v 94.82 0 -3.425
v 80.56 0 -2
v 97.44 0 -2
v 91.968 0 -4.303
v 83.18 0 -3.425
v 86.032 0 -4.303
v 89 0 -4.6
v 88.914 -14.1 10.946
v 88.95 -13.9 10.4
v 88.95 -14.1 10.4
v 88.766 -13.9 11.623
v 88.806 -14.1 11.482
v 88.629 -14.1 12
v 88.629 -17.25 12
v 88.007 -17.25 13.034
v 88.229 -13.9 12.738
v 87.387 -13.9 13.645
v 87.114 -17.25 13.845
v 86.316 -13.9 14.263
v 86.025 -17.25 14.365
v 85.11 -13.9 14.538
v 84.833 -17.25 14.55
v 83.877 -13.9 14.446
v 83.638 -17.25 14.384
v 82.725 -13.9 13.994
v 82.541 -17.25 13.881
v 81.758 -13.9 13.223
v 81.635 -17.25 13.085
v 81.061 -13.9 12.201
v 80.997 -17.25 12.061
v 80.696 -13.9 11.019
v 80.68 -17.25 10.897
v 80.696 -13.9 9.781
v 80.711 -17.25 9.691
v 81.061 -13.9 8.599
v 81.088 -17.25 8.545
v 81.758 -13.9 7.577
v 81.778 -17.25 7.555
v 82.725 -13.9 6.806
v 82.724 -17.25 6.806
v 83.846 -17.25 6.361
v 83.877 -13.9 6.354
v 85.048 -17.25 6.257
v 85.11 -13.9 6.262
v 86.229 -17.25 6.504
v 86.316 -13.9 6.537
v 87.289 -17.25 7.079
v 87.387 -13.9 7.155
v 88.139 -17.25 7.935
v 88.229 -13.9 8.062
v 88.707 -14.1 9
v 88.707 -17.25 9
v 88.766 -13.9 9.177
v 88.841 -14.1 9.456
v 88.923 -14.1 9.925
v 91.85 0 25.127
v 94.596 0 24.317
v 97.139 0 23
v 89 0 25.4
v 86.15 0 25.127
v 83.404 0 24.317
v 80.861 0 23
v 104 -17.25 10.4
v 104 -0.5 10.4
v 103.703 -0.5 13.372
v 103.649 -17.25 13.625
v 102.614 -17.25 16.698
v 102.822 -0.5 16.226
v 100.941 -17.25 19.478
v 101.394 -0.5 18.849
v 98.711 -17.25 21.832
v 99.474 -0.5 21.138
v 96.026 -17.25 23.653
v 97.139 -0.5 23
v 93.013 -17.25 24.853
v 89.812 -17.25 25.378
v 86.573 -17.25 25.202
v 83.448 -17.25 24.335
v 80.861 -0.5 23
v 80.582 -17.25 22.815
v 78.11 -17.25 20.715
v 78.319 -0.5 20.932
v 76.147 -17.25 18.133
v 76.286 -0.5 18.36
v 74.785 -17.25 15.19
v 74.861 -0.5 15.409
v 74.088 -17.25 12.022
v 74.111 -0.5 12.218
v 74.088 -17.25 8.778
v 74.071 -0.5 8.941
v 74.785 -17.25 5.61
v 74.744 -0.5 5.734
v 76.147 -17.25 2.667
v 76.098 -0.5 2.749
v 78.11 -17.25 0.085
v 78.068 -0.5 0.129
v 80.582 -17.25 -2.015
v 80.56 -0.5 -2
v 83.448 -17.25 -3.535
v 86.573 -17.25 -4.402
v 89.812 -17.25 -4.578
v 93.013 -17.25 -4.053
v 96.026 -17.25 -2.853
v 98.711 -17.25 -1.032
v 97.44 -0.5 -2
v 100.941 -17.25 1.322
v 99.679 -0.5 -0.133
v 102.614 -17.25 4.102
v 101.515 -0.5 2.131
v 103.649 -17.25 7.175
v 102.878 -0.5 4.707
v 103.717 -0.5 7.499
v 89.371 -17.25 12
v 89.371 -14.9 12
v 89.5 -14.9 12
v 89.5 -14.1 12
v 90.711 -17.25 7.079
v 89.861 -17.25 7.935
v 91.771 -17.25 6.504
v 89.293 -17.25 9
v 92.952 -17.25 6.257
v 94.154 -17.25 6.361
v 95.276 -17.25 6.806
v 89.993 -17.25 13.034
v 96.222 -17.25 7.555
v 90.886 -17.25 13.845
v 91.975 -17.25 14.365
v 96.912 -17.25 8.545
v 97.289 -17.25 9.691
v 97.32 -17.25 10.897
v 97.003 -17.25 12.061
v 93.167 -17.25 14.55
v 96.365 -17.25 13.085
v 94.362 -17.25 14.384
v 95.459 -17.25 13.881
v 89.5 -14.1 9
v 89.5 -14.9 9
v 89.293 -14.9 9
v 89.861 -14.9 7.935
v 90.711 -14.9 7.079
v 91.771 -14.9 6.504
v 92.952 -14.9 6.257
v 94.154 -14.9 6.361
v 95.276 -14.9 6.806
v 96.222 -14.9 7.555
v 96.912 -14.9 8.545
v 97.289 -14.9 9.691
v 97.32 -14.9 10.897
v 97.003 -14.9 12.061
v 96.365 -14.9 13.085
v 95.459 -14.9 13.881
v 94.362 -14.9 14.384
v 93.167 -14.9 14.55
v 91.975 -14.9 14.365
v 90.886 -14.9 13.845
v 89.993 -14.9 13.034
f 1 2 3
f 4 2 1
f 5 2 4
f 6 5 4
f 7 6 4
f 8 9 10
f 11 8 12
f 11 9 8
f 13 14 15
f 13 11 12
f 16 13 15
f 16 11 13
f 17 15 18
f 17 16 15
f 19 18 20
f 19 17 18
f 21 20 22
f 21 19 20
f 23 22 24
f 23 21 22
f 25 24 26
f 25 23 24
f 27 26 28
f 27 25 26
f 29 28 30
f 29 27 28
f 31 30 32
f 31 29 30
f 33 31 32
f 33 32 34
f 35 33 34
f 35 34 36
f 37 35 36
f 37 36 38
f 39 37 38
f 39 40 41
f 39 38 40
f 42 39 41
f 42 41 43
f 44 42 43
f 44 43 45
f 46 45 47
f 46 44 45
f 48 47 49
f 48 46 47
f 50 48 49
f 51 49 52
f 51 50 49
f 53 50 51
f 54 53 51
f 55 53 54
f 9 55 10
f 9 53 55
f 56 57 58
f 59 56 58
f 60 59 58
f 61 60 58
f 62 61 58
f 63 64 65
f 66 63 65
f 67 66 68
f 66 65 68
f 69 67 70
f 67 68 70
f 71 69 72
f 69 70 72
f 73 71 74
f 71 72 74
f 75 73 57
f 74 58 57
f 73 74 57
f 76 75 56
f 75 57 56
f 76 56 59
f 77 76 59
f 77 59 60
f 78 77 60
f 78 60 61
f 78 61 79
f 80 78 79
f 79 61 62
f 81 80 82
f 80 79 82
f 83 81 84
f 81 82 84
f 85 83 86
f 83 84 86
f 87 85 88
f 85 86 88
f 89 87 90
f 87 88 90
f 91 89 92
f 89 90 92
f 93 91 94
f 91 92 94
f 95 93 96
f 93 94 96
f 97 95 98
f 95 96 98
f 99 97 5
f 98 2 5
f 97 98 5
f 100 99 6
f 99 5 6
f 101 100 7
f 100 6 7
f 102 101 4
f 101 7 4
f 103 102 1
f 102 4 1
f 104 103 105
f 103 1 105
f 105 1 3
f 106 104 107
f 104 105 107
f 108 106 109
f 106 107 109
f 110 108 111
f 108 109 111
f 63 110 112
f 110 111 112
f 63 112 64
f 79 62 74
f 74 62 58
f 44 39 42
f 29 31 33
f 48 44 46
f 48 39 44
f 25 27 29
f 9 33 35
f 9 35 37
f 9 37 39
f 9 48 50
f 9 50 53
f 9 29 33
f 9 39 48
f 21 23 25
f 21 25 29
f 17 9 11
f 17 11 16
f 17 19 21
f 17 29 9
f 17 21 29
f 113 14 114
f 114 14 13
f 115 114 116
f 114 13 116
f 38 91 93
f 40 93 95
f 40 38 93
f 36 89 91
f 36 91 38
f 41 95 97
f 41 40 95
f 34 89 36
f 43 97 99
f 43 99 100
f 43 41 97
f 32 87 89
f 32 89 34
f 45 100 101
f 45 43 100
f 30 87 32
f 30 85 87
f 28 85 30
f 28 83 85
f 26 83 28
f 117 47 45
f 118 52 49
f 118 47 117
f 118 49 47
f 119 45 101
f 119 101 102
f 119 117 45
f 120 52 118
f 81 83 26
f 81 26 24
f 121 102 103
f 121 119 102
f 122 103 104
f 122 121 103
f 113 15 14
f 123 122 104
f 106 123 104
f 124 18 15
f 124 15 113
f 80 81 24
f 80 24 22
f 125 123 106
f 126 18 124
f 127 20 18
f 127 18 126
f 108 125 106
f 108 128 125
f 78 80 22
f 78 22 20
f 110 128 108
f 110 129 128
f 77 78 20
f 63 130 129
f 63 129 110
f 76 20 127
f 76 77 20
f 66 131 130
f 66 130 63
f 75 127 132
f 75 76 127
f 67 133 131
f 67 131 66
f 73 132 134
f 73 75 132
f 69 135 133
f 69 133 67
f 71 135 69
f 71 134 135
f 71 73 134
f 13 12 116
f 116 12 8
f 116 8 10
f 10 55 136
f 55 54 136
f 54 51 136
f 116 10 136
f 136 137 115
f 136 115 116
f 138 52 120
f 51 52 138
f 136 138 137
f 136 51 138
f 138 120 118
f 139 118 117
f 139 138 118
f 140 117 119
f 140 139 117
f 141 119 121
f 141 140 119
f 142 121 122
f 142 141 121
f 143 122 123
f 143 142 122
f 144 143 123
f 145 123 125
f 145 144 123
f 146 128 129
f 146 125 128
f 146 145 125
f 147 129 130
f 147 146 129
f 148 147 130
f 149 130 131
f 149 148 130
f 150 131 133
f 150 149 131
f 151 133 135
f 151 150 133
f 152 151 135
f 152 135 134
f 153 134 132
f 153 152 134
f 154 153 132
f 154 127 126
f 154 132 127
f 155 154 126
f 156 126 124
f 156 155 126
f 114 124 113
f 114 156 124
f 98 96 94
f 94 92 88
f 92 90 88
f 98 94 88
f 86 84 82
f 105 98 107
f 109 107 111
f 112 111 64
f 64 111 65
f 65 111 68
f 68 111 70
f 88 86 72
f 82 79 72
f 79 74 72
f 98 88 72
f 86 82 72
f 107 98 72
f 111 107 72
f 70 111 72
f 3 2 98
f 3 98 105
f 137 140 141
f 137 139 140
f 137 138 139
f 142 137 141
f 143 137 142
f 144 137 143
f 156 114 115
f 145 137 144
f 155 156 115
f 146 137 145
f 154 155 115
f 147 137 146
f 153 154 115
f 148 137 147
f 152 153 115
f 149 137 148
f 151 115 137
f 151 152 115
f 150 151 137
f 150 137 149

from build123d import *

# Parameters (mm, degrees)
BOX013_W            = 1
BOX013_H            = 3.2
BOX013_DEPTH        = 3
CYLINDER009_R       = 4.15
CYLINDER009_DEPTH   = 10
CYLINDER007_R       = 4.15
CYLINDER007_DEPTH   = 10
BOX007_W            = 50
BOX007_H            = 25
BOX007_DEPTH        = 0.5
SKETCH006_R         = 15
EXTRUDE003003_DEPTH = 17.25


with BuildPart() as cube012:
    # Box013 → Box013 (new body)
    with BuildSketch(Plane(origin=(88.5, -17.3, 9), x_dir=(1, 0, 0), z_dir=(0, 0, 1))):
        with Locations((0.5, 1.6)):
            Rectangle(BOX013_W, BOX013_H)
    extrude(amount=BOX013_DEPTH)


with BuildPart() as iman_chico_fuerte003:
    # Cylinder009 → Cylinder009 (new body)
    with BuildSketch(Plane(origin=(93.2, -14.9, 10.4), x_dir=(1, 0, 0), z_dir=(0, -1, 0))):
        Circle(CYLINDER009_R)
    extrude(amount=CYLINDER009_DEPTH)


with BuildPart() as iman_chico_fuerte001:
    # Cylinder007 → Cylinder007 (new body)
    with BuildSketch(Plane(origin=(84.8, -13.9, 10.4), x_dir=(1, 0, 0), z_dir=(0, -1, 0))):
        Circle(CYLINDER007_R)
    extrude(amount=CYLINDER007_DEPTH)


with BuildPart() as cube007:
    # Box007 → Box007 (new body)
    with BuildSketch(Plane(origin=(66, 0, -2), x_dir=(1, 0, 0), z_dir=(0, -1, 0))):
        with Locations((25, 12.5)):
            Rectangle(BOX007_W, BOX007_H)
    extrude(amount=BOX007_DEPTH)


with BuildPart() as pared_2_iman_fuerte_interno:
    # Sketch006 → Extrude003003 (new body)
    with BuildSketch(Plane.XZ):
        with Locations((89, 10.4)):
            Circle(SKETCH006_R)
    extrude(amount=EXTRUDE003003_DEPTH)

    # Cut005014006: cut Cube007
    add(cube007.part, mode=Mode.SUBTRACT)

    # Cut005014007: cut iman_chico_fuerte001
    add(iman_chico_fuerte001.part, mode=Mode.SUBTRACT)

    # Cut005014010: cut iman_chico_fuerte003
    add(iman_chico_fuerte003.part, mode=Mode.SUBTRACT)

    # Cut005014011: cut Cube012
    add(cube012.part, mode=Mode.SUBTRACT)


solid = pared_2_iman_fuerte_interno.part
